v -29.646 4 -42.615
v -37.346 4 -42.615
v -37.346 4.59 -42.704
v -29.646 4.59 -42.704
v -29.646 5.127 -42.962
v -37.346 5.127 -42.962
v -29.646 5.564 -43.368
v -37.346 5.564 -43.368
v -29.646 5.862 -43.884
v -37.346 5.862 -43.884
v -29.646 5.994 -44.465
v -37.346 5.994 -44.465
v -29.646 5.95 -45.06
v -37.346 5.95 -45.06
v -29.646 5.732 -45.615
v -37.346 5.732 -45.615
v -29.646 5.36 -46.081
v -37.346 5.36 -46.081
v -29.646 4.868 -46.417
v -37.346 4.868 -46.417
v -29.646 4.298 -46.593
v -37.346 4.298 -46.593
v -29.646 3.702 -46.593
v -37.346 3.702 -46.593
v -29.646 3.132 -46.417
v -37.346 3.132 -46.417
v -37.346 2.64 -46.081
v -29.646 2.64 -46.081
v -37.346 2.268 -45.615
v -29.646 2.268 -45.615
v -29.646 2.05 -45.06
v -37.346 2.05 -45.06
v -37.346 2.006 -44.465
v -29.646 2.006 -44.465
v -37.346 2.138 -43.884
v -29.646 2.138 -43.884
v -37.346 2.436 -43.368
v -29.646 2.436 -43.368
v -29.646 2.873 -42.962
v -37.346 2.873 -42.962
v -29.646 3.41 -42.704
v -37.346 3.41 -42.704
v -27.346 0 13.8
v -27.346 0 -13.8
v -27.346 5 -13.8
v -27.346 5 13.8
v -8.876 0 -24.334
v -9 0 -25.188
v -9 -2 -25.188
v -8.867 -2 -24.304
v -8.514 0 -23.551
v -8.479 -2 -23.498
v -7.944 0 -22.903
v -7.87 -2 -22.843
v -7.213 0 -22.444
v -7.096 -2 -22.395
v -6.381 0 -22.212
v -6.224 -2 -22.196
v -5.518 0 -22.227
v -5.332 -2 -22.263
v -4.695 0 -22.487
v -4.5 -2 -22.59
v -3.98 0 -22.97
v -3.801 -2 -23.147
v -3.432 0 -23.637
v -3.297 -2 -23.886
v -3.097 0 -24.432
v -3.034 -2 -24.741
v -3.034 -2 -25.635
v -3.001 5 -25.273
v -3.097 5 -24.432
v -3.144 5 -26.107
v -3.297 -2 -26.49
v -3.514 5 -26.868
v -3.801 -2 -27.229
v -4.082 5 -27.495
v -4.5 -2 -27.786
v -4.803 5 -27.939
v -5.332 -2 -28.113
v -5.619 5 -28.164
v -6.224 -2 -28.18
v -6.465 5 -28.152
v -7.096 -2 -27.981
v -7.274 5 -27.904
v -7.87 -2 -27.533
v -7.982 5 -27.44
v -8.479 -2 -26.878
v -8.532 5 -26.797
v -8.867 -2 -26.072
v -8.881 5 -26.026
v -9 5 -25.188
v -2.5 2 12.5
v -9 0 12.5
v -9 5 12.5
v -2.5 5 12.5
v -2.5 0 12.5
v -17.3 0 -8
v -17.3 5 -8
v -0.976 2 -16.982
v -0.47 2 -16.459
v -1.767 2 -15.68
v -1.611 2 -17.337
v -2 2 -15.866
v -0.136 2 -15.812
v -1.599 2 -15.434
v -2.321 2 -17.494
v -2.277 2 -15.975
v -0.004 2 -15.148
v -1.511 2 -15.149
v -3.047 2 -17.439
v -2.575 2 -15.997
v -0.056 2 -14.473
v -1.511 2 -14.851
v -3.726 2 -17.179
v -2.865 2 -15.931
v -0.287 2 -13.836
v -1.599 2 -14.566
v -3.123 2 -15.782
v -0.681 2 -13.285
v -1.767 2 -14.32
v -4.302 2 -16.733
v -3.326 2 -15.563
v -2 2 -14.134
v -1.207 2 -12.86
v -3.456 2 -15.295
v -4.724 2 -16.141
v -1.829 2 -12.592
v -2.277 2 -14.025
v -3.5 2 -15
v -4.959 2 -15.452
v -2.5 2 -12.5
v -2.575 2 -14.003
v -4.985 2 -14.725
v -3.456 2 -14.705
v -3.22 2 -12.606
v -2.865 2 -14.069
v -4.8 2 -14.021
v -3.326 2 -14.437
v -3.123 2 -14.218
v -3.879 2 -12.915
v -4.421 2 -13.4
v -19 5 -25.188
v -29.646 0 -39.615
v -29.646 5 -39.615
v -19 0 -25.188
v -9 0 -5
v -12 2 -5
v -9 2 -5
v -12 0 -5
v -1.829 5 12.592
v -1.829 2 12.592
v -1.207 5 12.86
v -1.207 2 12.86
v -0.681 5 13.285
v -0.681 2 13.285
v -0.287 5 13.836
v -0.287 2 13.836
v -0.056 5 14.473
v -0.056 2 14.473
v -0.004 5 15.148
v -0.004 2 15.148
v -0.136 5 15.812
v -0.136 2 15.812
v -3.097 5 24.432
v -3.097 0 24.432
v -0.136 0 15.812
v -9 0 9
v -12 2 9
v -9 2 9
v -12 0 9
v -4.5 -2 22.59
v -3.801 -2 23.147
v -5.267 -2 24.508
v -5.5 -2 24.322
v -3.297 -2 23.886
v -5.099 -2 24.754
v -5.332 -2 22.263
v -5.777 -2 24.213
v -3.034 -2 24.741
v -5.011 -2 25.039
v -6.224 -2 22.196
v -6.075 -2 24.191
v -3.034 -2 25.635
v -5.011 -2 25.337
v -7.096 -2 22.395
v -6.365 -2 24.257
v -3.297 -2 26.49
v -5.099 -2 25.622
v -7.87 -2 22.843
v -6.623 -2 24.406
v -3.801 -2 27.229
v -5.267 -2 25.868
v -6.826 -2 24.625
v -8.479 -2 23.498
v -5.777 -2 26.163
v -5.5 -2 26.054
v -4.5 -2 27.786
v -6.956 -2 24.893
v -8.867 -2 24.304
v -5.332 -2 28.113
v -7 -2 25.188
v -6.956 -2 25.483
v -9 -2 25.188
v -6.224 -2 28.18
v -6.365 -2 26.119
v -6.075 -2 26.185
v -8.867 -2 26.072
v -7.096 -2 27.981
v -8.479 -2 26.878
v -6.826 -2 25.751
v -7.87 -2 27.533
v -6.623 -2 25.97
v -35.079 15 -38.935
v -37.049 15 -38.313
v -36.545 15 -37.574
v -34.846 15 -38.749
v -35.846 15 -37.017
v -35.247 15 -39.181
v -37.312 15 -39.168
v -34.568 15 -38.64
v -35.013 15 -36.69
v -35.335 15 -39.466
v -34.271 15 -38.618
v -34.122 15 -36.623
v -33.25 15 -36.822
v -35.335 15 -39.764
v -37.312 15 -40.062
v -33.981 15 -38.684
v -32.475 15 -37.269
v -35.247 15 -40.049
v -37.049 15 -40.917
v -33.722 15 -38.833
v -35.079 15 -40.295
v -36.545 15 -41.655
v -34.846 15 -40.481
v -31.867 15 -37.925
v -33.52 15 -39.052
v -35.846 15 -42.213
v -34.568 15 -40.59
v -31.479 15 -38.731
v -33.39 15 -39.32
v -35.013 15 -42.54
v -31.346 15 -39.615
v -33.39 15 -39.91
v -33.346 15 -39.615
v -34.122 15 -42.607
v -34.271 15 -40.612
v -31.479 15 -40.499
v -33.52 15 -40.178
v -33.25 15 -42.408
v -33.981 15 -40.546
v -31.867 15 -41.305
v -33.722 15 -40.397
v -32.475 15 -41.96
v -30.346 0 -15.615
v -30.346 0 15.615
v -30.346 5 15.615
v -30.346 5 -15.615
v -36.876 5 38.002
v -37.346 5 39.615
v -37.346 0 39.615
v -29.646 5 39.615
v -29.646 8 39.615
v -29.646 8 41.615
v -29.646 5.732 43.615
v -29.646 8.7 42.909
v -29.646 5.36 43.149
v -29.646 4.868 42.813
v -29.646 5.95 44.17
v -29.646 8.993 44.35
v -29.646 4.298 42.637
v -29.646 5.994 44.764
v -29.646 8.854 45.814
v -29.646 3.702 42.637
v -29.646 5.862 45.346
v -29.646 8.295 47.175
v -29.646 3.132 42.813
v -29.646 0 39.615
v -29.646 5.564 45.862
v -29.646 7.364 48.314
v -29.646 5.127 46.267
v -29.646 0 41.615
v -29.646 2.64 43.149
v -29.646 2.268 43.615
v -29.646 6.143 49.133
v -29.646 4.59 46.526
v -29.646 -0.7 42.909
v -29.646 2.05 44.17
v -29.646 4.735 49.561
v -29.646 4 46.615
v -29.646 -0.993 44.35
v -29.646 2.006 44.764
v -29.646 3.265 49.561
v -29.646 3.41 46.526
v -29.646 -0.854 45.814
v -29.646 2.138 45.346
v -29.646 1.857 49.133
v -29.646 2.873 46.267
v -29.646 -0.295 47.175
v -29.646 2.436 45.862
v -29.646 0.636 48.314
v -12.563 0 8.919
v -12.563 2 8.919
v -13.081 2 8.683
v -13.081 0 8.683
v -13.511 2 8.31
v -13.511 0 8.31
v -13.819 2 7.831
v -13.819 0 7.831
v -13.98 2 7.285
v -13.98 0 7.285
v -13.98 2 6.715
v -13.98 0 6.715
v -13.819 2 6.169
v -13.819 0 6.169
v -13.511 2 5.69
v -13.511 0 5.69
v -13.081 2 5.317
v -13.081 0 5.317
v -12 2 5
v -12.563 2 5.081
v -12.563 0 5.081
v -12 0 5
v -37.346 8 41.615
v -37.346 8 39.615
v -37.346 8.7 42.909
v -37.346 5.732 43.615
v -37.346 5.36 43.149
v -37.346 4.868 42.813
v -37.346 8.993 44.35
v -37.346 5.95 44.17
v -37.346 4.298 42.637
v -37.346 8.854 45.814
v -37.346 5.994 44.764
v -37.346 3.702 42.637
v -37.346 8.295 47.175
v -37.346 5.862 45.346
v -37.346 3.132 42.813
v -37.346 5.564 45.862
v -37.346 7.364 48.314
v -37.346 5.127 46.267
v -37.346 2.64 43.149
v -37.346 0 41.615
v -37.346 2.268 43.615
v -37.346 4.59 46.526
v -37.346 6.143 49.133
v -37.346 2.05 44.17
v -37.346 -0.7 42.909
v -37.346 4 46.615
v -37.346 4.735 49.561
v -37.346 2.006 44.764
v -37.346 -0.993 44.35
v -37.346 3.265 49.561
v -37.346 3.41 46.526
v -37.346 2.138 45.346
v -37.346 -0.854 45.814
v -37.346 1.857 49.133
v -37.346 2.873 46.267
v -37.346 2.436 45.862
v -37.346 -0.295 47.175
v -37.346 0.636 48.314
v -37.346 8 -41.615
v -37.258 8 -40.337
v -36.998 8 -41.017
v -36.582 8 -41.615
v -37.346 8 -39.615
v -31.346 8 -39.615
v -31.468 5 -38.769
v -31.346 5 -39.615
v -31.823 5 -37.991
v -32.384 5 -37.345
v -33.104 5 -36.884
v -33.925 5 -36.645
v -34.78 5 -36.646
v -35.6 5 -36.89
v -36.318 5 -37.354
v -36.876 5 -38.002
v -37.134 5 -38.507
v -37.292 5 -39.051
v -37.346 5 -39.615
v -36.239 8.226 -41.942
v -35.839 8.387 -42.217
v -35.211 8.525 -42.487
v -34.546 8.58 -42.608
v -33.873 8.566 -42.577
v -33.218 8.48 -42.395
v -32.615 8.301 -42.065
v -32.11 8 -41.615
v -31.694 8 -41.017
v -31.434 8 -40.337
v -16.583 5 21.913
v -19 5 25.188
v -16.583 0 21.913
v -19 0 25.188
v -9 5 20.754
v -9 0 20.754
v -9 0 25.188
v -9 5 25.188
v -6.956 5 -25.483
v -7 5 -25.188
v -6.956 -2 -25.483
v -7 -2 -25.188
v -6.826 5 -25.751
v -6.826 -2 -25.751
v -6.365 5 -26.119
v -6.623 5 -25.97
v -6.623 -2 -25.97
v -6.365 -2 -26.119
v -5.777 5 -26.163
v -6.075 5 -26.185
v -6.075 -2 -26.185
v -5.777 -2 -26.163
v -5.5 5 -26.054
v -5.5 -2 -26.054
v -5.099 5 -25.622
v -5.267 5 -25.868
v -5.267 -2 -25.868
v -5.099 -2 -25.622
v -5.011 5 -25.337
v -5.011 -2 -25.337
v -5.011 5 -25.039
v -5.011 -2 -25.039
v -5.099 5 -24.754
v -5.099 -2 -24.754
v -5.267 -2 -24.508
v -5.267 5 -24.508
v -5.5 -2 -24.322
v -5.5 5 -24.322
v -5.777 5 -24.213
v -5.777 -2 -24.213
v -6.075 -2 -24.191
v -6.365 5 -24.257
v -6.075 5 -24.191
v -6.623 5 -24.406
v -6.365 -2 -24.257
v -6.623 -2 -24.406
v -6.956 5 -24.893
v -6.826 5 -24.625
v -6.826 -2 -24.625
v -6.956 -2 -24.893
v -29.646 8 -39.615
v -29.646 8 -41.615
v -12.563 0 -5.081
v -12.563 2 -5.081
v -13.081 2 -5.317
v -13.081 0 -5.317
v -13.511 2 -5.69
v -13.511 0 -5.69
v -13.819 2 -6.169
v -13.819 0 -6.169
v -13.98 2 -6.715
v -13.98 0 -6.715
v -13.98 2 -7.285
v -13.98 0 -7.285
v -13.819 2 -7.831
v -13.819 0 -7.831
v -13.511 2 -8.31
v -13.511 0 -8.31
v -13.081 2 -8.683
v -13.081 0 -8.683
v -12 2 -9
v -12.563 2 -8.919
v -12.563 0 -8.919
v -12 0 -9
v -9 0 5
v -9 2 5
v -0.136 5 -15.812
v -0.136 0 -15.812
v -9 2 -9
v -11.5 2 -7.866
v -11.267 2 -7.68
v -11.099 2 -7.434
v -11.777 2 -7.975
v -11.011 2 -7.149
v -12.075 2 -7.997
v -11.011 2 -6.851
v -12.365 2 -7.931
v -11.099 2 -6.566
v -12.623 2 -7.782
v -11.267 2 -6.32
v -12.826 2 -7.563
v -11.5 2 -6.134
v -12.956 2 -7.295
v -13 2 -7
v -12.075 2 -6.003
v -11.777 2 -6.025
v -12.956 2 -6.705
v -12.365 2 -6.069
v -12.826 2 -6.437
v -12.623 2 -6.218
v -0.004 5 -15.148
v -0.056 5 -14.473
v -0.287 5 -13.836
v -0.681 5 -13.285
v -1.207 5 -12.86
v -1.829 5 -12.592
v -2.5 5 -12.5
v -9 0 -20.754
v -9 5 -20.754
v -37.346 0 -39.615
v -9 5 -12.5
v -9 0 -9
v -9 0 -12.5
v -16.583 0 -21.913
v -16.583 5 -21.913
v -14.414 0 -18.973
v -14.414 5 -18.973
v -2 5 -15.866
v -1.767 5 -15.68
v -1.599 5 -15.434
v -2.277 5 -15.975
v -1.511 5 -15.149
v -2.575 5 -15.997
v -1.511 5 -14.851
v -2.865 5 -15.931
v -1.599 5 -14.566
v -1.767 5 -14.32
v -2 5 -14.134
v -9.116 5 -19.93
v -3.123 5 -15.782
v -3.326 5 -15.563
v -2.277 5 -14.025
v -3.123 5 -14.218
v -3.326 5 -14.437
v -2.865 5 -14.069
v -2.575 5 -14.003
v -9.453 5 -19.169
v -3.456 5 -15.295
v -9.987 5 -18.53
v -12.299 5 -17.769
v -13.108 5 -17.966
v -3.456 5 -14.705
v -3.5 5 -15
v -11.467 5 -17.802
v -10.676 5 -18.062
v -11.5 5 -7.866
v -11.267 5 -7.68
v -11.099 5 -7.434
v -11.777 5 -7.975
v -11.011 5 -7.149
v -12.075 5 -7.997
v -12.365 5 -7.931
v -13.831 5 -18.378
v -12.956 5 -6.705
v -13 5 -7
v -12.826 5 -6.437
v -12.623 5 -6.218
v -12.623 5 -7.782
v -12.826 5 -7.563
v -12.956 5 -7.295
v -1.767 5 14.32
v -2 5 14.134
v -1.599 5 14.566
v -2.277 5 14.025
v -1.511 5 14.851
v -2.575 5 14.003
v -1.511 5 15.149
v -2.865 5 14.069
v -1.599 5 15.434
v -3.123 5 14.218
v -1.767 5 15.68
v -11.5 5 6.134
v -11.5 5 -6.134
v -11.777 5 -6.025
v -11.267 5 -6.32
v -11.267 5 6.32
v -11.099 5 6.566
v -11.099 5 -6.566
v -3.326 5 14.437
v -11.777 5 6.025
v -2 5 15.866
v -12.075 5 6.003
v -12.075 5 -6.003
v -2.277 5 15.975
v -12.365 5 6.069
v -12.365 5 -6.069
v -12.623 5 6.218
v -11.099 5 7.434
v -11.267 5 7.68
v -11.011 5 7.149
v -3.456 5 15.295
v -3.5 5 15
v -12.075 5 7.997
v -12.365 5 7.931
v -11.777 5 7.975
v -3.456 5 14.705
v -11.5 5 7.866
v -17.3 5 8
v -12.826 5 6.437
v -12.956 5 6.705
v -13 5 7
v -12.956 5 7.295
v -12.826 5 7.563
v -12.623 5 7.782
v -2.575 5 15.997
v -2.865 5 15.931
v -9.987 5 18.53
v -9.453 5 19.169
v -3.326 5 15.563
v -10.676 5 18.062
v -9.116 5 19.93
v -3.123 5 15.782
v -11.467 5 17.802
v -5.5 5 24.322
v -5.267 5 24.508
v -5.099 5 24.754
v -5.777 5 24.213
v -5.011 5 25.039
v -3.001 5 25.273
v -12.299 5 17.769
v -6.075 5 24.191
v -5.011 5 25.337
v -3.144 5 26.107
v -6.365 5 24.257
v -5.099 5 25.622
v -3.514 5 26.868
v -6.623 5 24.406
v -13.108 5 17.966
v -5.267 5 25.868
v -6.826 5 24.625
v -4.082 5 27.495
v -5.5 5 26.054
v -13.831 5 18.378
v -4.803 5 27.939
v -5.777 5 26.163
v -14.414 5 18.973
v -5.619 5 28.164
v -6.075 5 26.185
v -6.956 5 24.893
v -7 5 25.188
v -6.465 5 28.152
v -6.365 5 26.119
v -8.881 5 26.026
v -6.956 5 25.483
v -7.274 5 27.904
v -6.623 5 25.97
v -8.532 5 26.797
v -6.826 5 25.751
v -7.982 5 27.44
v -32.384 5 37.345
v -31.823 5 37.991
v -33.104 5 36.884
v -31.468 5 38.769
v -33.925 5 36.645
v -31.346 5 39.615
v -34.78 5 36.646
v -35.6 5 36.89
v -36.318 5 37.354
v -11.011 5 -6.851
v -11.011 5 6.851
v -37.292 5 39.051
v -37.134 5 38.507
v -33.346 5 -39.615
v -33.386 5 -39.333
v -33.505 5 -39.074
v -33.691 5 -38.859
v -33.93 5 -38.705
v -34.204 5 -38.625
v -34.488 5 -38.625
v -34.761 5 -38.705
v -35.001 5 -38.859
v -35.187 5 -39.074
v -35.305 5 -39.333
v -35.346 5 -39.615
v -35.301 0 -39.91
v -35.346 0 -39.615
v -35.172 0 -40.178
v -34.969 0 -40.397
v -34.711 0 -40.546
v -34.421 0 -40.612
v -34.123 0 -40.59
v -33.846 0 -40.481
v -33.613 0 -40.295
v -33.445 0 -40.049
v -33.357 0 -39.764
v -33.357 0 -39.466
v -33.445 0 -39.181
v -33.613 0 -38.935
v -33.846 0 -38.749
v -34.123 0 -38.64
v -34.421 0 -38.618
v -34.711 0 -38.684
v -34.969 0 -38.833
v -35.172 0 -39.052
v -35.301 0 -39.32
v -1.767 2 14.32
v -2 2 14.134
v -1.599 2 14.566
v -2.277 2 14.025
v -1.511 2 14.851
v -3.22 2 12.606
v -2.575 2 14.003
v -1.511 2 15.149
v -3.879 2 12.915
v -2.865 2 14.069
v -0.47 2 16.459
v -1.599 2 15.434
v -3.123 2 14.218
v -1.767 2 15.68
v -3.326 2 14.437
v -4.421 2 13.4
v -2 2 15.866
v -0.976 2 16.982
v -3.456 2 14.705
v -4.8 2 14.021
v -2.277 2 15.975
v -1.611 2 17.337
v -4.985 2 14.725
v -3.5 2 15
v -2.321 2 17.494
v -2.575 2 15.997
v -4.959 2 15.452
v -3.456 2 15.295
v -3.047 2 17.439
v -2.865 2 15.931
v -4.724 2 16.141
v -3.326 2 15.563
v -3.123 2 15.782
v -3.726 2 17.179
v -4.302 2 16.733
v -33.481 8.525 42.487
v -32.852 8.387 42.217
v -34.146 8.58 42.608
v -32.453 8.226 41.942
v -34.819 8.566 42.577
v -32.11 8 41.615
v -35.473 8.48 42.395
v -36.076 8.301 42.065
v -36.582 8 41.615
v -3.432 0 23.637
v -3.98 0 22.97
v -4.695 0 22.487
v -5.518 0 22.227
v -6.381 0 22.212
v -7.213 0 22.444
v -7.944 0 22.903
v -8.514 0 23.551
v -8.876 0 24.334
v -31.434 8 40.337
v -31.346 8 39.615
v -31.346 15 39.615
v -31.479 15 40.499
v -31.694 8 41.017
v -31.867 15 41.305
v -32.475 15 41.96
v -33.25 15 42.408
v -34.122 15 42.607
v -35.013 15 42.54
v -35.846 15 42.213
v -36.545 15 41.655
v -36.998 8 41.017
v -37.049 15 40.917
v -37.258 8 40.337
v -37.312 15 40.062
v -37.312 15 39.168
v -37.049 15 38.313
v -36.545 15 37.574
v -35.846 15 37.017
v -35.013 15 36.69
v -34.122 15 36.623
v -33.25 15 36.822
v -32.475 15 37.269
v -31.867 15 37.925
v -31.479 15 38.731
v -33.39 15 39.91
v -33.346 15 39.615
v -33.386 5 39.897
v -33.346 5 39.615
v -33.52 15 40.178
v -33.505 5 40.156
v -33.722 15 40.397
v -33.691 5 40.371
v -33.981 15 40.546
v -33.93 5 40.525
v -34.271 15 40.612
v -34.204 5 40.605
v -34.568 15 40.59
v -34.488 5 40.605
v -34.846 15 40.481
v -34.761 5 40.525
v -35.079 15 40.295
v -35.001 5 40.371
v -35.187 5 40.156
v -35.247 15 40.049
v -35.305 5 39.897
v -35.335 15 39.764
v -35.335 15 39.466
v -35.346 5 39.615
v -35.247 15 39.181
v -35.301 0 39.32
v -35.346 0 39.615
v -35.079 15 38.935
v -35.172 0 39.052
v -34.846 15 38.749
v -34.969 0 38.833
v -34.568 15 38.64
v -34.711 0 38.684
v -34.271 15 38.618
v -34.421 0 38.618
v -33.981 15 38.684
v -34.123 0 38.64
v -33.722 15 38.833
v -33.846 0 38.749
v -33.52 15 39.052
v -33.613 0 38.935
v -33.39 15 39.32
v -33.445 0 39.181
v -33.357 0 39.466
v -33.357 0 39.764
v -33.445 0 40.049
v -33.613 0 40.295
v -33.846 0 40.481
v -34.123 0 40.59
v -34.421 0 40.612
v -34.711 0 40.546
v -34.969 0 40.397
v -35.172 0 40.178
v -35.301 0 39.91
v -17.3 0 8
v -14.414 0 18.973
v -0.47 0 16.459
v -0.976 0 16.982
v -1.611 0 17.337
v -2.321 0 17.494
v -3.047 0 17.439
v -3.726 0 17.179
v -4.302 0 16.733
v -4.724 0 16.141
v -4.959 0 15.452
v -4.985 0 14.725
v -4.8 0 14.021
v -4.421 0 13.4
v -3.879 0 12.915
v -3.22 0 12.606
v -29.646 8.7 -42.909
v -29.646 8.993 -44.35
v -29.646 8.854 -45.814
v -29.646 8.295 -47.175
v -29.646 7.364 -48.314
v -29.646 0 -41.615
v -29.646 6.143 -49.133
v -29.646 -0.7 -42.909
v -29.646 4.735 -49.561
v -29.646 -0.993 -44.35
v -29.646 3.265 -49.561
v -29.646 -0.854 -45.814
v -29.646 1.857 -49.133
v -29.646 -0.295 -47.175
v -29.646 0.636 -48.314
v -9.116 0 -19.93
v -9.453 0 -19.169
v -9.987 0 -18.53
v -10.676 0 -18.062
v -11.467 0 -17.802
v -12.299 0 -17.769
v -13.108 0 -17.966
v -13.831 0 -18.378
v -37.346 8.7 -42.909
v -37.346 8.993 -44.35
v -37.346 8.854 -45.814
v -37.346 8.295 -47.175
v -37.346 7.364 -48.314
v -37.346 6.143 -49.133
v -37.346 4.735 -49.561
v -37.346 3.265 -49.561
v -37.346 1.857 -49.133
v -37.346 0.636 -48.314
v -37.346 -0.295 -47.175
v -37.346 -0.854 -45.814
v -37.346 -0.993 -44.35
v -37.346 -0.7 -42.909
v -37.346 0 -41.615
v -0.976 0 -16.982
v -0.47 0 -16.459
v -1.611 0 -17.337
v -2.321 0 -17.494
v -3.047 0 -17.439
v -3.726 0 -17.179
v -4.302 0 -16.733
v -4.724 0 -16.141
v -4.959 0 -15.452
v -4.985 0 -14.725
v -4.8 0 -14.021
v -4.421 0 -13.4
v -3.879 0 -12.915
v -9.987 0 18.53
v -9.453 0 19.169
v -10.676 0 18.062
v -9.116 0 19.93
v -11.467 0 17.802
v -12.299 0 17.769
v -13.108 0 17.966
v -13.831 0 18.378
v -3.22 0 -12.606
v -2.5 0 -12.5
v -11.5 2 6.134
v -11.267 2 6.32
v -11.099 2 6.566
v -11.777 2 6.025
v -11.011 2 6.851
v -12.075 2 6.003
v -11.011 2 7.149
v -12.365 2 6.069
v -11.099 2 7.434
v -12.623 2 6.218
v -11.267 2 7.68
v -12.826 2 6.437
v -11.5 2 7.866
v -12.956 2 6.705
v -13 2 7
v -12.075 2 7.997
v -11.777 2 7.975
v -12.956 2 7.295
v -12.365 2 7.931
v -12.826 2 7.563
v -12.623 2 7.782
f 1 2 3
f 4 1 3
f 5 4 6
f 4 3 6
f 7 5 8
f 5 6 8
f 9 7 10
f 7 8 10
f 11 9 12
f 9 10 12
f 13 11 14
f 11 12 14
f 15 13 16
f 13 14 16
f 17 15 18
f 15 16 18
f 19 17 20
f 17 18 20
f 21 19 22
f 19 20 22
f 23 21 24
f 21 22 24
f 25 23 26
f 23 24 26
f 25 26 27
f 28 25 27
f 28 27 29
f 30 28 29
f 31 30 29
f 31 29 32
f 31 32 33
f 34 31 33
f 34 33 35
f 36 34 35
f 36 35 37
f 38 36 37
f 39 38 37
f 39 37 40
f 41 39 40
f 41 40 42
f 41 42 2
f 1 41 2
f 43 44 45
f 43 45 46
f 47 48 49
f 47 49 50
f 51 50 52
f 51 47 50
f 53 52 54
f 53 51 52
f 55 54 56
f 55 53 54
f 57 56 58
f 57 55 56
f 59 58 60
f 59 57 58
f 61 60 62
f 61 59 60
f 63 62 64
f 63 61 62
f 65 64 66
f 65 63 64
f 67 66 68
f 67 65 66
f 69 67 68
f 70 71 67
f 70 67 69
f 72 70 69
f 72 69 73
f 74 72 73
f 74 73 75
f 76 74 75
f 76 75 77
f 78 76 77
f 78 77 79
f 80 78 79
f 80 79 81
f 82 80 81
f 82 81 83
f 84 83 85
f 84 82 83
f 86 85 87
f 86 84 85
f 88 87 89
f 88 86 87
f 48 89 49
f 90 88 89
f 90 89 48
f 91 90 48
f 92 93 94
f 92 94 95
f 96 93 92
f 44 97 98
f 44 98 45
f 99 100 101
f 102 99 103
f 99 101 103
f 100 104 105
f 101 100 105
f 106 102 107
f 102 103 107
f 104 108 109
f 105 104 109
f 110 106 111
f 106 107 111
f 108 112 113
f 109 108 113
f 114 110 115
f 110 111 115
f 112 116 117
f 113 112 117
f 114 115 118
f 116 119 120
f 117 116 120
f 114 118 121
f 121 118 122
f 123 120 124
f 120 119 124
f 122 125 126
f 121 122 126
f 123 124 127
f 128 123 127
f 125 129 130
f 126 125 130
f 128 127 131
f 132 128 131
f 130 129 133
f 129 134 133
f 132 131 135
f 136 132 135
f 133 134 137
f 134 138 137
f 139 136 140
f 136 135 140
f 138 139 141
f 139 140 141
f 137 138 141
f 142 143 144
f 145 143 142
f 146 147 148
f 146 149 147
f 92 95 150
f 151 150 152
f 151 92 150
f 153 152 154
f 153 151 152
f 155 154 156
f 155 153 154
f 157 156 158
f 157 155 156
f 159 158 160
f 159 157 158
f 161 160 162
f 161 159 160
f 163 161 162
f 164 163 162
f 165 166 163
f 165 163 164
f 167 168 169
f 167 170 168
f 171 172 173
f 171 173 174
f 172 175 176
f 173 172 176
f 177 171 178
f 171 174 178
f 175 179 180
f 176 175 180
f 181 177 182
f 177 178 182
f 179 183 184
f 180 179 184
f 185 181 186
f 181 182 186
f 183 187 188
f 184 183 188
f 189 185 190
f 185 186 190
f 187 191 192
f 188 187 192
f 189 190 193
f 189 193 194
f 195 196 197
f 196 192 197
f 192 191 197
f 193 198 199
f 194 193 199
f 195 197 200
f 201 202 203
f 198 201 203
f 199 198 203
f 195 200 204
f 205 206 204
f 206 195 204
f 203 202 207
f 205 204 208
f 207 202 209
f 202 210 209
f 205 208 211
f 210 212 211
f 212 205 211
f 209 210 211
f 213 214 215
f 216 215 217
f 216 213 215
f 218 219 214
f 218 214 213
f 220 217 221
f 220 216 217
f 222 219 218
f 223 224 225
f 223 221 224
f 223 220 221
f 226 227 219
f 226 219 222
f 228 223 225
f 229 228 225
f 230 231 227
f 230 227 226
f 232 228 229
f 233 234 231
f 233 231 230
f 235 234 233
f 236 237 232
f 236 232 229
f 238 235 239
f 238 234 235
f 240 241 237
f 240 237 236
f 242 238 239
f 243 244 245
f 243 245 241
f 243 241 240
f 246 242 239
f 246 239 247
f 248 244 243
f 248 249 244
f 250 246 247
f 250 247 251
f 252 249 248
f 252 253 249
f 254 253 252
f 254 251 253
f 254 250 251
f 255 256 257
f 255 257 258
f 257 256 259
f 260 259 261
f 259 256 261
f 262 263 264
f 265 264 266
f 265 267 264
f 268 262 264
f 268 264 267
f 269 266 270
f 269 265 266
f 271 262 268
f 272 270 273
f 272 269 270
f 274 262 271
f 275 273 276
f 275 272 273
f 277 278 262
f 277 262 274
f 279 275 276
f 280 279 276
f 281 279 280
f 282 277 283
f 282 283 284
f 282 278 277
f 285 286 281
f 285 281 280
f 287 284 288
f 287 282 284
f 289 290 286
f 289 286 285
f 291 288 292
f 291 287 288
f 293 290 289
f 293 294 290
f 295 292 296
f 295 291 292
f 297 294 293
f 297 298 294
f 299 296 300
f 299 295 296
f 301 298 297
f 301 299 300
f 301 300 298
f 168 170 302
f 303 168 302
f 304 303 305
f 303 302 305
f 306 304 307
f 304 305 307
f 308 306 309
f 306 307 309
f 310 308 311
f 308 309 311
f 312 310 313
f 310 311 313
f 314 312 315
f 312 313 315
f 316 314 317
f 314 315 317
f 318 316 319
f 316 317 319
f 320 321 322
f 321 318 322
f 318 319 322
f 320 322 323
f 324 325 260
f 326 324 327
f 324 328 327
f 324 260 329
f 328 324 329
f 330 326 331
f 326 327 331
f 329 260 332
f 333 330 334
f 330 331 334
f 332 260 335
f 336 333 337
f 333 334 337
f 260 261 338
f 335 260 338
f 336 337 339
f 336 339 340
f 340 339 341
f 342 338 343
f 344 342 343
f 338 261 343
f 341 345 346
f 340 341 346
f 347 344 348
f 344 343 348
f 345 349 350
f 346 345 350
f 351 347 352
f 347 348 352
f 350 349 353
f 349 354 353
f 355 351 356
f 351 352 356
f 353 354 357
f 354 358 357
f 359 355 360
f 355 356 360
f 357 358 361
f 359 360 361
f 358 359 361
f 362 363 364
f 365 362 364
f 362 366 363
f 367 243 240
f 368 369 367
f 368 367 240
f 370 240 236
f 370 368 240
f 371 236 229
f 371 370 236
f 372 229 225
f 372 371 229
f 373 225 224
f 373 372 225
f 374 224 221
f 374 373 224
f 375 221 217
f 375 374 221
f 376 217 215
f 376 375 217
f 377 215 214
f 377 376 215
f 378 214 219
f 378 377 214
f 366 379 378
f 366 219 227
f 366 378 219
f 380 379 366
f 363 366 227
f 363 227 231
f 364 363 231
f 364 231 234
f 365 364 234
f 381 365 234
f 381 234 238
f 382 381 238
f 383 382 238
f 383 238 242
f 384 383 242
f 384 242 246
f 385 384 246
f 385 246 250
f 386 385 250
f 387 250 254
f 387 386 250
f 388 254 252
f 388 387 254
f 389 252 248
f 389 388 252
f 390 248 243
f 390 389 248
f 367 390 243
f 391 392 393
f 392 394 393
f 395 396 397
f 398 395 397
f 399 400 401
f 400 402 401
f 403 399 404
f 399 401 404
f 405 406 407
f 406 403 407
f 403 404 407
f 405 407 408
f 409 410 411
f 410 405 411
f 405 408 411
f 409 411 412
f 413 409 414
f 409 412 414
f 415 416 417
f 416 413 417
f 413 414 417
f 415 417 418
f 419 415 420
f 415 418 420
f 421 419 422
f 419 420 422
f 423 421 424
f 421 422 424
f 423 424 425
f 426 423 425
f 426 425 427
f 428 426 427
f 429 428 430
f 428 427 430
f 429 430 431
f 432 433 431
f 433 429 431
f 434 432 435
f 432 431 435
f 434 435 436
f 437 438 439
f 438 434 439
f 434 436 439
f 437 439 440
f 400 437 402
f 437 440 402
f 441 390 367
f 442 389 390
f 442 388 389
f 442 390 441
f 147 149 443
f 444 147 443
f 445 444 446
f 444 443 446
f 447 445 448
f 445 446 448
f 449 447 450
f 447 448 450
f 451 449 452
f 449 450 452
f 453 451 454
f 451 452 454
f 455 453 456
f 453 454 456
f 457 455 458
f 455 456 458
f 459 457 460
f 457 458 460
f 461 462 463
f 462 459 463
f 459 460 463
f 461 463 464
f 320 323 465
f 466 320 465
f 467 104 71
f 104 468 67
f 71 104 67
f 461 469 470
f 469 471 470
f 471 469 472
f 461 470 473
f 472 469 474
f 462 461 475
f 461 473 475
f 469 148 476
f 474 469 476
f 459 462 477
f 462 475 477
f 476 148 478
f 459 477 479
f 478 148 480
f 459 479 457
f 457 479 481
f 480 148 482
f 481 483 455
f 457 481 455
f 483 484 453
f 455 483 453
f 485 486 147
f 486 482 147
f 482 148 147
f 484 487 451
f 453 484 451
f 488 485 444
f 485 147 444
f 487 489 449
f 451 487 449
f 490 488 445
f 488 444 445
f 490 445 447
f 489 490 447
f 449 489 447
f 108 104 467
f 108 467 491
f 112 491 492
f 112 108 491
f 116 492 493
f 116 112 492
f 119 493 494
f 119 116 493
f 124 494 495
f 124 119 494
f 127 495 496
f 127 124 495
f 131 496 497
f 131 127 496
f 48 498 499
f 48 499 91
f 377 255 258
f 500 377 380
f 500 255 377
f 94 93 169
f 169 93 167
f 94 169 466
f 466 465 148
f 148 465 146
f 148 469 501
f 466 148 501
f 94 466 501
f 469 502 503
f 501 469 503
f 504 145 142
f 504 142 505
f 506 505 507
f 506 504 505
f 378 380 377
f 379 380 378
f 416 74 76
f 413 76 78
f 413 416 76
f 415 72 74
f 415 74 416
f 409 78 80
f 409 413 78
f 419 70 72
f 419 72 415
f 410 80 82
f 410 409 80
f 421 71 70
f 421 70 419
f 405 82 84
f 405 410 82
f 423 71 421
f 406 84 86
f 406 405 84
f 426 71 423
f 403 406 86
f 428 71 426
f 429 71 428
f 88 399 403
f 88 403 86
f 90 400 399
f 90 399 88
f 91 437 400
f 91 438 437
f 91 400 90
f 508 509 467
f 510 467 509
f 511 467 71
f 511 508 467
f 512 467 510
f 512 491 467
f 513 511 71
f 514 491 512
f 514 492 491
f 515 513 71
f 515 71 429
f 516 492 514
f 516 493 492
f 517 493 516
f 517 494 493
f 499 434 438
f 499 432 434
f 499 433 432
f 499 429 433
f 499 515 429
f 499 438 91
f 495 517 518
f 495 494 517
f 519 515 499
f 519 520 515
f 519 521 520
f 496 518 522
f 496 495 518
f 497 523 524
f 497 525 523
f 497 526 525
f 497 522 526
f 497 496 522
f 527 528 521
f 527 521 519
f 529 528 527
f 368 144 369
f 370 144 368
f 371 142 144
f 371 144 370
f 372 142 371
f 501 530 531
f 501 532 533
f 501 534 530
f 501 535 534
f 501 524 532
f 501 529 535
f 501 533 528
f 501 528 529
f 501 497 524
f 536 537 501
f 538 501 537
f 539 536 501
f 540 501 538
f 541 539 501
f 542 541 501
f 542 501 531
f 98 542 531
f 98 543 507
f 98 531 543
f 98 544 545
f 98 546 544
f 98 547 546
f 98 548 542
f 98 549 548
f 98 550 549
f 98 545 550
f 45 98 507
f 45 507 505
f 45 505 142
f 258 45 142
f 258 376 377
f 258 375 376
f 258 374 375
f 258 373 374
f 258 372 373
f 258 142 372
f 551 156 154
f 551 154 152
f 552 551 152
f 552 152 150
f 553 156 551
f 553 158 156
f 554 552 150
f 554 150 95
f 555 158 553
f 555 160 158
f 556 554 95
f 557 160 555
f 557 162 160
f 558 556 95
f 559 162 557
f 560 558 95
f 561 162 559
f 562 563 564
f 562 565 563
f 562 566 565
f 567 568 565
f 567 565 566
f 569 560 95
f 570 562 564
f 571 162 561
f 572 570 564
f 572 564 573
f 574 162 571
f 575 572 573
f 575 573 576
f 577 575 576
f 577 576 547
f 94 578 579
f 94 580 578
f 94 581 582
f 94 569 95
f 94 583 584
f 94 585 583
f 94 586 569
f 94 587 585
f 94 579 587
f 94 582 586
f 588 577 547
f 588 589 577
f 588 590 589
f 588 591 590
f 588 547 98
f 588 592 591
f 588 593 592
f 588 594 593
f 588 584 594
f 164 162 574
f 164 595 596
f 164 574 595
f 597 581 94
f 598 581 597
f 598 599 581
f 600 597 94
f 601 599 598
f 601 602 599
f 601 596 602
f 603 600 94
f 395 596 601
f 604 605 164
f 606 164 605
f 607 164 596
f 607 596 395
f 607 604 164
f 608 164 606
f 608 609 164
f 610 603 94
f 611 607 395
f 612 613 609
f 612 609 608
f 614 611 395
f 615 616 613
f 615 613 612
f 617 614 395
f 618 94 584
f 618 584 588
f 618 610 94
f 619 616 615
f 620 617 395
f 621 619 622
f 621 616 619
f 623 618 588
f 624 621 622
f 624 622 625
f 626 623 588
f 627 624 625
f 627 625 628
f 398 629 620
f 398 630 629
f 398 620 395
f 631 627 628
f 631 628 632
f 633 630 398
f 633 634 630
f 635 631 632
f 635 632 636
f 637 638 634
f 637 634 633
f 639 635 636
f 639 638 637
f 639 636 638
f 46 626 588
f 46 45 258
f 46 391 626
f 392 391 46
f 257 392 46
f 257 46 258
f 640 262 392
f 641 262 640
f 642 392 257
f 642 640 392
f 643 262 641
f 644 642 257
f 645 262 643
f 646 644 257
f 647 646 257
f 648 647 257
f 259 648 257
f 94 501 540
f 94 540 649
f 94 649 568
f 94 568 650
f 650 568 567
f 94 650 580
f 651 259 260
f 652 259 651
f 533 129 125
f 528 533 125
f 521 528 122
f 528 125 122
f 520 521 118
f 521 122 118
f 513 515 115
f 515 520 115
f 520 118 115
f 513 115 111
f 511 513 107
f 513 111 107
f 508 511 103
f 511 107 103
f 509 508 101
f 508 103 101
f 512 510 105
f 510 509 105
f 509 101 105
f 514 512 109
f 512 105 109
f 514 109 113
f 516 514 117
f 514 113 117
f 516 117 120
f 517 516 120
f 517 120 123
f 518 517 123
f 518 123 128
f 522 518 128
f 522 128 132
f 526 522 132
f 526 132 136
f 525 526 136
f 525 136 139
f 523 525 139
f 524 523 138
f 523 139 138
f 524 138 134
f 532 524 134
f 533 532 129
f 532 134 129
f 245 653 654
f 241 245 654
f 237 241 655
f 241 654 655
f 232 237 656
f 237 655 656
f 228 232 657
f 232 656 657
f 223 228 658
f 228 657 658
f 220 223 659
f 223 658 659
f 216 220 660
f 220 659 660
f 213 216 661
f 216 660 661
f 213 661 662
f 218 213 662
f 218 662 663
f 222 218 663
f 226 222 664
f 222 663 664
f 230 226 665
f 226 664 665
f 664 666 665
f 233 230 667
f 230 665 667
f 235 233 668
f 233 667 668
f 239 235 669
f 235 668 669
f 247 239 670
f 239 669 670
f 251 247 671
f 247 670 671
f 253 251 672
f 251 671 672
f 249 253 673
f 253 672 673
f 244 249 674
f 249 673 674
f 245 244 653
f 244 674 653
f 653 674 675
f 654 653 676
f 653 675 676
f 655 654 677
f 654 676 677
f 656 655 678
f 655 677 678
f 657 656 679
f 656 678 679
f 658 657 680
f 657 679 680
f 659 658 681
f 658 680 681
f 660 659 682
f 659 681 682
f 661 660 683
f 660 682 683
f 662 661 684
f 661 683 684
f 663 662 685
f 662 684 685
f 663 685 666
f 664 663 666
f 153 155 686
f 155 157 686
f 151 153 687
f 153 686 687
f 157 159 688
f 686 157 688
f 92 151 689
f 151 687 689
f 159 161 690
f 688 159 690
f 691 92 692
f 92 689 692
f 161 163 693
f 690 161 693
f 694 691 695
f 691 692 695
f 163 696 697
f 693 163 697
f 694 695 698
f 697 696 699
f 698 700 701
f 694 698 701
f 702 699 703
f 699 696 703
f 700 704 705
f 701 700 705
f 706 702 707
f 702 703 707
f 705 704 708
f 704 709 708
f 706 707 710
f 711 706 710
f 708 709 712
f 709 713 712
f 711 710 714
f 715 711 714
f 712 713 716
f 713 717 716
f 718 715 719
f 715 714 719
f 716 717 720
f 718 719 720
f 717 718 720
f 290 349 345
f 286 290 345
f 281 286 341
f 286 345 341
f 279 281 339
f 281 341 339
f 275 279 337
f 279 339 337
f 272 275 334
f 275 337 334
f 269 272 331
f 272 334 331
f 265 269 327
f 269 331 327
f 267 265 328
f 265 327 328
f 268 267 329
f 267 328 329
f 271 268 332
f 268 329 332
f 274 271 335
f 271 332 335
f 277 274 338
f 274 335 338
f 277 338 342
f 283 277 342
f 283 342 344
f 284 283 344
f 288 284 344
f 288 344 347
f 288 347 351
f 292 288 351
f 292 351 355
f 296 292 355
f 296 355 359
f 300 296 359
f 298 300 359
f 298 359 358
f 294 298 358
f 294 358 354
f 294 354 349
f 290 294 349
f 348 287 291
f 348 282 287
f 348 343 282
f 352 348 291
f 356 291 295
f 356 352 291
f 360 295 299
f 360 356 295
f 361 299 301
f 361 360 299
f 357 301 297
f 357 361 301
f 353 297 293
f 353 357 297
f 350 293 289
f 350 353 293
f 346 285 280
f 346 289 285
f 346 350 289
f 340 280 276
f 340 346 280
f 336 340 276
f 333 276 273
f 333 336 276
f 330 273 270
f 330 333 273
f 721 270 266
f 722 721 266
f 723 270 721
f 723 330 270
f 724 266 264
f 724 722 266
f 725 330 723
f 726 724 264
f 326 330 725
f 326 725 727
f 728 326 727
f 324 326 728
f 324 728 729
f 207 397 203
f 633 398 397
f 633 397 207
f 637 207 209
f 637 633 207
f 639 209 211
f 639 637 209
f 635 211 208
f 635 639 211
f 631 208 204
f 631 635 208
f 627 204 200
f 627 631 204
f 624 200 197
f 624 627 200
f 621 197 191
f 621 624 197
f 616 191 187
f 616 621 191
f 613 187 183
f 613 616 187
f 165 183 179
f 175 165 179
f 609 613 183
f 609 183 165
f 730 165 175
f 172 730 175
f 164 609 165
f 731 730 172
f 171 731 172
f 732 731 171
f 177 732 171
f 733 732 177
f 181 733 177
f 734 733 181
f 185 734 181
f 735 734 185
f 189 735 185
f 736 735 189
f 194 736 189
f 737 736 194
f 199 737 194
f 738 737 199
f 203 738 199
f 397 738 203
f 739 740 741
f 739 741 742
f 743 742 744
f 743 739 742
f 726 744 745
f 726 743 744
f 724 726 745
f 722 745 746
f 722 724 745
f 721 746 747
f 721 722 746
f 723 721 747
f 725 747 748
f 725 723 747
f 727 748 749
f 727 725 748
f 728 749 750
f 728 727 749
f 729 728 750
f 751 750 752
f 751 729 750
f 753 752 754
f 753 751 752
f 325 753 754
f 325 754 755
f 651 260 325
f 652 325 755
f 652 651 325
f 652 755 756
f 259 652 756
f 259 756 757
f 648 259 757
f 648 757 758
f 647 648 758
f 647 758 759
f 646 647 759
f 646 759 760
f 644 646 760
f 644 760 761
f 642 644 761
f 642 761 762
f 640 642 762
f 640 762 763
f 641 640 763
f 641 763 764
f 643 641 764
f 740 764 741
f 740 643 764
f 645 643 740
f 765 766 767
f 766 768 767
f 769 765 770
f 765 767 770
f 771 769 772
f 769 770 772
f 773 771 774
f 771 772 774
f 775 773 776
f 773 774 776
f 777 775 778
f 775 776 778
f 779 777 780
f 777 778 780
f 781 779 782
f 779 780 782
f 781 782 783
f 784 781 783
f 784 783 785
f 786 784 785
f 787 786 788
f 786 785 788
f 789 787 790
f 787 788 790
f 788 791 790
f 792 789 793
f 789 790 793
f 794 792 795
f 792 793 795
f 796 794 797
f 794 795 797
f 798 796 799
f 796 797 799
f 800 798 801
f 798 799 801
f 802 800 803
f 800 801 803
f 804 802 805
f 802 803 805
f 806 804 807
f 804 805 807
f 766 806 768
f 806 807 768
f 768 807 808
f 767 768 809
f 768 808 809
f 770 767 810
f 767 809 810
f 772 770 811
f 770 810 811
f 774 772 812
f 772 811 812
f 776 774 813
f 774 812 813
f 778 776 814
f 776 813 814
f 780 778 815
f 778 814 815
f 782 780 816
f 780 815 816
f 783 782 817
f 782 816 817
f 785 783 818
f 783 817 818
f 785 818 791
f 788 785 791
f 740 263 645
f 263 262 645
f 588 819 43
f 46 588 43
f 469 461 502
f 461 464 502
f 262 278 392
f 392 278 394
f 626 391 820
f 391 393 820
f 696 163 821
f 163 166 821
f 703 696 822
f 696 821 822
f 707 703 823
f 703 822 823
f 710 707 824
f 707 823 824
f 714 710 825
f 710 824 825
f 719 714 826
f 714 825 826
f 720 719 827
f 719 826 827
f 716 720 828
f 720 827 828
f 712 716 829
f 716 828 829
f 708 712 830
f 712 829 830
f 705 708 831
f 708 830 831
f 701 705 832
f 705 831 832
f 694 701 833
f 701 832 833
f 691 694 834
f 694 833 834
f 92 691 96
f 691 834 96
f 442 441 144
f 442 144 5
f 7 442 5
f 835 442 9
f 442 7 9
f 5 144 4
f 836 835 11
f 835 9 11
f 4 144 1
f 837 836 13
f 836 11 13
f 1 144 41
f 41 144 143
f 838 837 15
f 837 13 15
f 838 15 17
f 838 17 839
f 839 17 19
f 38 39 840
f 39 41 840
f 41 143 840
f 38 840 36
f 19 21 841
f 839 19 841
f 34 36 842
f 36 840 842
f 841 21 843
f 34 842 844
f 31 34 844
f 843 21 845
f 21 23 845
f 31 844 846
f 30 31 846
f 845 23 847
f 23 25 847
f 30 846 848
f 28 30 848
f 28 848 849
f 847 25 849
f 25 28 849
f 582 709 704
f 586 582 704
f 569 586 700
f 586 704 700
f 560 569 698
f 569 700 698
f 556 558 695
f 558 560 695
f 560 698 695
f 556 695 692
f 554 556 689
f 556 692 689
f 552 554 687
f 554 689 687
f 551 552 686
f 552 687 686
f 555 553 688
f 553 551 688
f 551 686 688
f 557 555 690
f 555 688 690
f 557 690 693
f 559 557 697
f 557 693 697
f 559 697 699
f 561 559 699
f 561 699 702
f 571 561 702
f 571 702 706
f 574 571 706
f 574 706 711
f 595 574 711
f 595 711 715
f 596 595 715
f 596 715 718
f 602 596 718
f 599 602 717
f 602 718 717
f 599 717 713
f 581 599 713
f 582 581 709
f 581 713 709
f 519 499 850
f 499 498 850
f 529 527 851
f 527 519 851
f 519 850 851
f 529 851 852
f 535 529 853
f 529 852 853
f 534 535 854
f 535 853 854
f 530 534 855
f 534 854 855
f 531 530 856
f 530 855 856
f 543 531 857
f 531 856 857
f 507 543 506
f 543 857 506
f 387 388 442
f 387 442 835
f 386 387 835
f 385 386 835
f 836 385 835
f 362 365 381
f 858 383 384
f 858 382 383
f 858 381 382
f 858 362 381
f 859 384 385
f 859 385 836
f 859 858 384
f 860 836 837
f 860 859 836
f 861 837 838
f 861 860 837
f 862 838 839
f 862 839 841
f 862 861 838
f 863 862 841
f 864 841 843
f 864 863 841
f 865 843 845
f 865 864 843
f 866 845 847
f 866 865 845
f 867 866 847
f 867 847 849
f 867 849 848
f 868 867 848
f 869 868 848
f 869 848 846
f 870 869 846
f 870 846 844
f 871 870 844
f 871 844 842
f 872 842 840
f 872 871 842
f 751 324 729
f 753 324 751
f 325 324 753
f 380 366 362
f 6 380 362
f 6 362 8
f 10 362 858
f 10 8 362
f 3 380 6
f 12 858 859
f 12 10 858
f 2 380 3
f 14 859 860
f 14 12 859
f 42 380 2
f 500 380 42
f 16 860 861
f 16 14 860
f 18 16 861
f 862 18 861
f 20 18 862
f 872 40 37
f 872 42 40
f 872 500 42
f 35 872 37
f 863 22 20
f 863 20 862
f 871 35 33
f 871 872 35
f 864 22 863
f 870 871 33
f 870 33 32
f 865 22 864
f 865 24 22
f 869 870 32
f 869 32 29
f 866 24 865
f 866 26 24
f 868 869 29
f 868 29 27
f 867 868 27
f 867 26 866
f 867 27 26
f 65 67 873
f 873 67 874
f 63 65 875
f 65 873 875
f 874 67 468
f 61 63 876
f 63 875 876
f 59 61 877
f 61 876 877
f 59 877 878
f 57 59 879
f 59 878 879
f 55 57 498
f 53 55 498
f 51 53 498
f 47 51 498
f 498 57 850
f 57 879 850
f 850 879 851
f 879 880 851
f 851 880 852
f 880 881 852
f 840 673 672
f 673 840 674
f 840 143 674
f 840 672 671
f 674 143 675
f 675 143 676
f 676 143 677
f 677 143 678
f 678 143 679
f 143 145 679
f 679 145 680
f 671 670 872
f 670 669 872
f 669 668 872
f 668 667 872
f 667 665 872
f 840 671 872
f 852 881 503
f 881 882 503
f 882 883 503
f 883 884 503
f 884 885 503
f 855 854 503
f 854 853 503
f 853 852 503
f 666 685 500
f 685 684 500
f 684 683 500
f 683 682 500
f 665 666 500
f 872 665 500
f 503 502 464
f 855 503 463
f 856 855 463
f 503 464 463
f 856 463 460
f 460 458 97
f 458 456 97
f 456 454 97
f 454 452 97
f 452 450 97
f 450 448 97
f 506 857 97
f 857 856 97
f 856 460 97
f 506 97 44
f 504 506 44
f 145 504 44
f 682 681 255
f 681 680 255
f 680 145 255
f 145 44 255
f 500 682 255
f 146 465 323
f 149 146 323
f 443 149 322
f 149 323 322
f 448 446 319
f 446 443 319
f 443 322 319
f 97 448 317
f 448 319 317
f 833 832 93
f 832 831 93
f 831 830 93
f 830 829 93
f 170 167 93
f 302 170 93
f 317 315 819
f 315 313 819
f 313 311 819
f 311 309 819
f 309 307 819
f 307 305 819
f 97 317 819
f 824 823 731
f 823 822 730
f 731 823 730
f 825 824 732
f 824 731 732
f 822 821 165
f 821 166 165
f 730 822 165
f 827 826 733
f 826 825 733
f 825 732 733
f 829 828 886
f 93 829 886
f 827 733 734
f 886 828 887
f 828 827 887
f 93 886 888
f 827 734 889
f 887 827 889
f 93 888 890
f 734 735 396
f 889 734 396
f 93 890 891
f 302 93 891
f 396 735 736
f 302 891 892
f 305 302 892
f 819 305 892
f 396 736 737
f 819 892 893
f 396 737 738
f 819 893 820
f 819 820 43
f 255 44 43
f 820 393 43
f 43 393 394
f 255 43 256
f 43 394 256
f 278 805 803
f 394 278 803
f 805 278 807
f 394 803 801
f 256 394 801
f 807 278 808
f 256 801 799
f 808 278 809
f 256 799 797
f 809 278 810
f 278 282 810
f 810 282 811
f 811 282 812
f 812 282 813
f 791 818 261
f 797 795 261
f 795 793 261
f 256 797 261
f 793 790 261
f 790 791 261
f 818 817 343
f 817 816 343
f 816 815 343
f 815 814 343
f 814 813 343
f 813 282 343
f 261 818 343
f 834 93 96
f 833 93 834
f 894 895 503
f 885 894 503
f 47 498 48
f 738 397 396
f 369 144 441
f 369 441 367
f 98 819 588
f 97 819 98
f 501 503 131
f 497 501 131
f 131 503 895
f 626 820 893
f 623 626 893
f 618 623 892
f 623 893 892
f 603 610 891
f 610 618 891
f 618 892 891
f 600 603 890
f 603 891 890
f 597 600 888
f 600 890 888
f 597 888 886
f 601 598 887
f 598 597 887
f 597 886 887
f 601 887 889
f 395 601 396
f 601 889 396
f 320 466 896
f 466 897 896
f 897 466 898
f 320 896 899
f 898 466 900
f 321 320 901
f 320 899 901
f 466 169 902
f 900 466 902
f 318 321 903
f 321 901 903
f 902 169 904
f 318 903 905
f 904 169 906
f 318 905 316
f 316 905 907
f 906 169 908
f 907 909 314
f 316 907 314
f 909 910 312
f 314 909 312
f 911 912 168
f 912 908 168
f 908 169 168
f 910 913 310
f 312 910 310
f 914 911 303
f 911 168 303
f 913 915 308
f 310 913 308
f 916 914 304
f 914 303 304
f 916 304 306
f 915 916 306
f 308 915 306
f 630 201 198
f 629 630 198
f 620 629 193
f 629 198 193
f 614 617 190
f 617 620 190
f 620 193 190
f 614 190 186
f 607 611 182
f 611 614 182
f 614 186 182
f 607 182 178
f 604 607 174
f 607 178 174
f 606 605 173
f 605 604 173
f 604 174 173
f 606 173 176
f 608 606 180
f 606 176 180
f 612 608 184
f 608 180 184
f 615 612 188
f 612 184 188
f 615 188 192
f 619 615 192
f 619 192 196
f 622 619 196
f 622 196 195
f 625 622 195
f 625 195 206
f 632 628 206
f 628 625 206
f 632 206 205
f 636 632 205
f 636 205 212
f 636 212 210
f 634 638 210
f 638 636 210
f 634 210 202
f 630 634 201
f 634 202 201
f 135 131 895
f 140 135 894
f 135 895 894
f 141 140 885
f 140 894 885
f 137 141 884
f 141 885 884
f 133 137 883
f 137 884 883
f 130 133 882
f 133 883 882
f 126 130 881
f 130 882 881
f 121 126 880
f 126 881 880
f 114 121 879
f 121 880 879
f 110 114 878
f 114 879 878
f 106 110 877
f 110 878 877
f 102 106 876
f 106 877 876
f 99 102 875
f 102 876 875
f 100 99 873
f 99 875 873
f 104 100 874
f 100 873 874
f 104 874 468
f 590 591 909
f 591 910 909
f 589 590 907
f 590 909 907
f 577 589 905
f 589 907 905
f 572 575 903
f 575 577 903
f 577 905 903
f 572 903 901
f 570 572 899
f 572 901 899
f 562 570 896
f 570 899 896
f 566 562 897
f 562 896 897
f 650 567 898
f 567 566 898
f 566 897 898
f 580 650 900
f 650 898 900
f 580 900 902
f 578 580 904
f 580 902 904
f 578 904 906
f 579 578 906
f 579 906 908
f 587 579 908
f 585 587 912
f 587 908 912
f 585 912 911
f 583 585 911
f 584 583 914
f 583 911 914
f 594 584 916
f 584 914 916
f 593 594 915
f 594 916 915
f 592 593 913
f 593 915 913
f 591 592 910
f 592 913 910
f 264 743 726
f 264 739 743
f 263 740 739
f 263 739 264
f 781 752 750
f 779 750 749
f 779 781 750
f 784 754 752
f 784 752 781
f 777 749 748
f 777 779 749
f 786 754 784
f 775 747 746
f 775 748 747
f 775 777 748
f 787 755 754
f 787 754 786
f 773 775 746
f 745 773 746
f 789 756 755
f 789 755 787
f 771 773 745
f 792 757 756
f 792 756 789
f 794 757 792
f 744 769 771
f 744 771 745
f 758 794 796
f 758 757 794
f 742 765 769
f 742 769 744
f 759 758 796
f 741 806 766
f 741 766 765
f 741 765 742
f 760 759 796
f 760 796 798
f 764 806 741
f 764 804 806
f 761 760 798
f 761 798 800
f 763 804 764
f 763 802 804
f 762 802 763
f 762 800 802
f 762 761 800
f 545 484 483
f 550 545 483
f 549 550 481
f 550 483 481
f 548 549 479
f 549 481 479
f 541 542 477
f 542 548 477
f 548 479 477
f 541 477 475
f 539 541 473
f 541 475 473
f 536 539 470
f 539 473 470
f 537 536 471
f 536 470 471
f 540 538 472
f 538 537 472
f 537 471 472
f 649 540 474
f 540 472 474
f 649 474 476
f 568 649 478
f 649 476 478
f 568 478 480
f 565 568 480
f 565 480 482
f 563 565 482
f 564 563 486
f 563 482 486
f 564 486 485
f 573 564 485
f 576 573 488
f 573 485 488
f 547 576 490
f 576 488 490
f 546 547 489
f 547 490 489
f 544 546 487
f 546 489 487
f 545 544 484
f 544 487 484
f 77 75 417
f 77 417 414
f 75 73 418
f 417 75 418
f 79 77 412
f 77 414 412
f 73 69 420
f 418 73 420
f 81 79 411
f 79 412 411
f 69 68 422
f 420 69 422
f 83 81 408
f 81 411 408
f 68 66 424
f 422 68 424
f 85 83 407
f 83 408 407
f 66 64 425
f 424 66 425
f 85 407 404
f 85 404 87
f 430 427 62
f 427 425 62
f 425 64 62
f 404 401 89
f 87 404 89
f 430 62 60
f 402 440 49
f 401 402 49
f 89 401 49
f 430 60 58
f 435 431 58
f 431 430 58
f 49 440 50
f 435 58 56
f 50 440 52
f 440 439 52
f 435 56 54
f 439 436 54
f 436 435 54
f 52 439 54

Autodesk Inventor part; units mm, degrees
ref_plane "YZ Plane" through (0, 0, 0) normal (1, 0, 0) x (0, 1, 0)
ref_plane "XZ Plane" through (0, 0, 0) normal (0, 1, 0) x (-1, 0, 0)
ref_plane "XY Plane" through (0, 0, 0) normal (0, 0, 1) x (1, 0, 0)
sketch "Sketch1" plane through (0, 0, 0) normal (0, 1, 0) x (-1, 0, 0)
  line L0 (0, 0) -> (9, 0)
  line L1 (9, 0) -> (9, -12.5)
  line L2 (9, -12.5) -> (2.5, -12.5)
  circle A0 centre (2.5, -15) radius 2.5
  circle A1 centre (2.5, -15) radius 1
  line L3 (2.5, -15) -> (17.5, -15) construction
  circle A2 centre (6, -25.188) radius 3
  circle A3 centre (6, -25.188) radius 1
  line L4 (0, -15.4175) -> (3.0968, -24.4319)
  line L5 (9, 0) -> (17.3, 0)
  line L6 (17.3, 0) -> (17.3, -8)
  line L7 (17.3, -8) -> (27.3459, -13.8)
  line L8 (27.3459, -13.8) -> (27.3459, 0)
  line L9 (30.3459, 0) -> (30.3459, -15.6149)
  line L10 (30.3459, -15.6149) -> (37.3459, -39.6149)
  line L11 (37.3459, -39.6149) -> (37.3459, -49.6149)
  line L12 (29.6459, -39.6149) -> (29.6459, -49.6149)
  line L13 (37.3459, -49.6149) -> (29.6459, -49.6149)
  line L14 (29.6459, -39.6149) -> (80.5305, -39.6149) construction
  arc A4 (14.4139, -18.9731) -> (9, -20.7544) centre (12, -20.7544) ccw
  line L15 (29.6459, -39.6149) -> (19, -25.188)
  line L16 (19, -25.188) -> (16.5834, -21.9131)
  line L17 (16.5834, -21.9131) -> (14.4139, -18.9731)
  line L18 (9, -20.7544) -> (9, -25.188)
  circle A5 centre (12, -7) radius 1
  circle A6 centre (34.3459, -39.6149) radius 3
  circle A7 centre (34.3459, -39.6149) radius 1
  line L19 (30.3459, 0) -> (0, 0)
  line L20 (9, 0) -> (9, 12.5)
  line L21 (9, 12.5) -> (2.5, 12.5)
  circle A8 centre (2.5, 15) radius 2.5
  circle A9 centre (2.5, 15) radius 1
  line L22 (2.5, 15) -> (17.5, 15) construction
  circle A10 centre (6, 25.188) radius 3
  circle A11 centre (6, 25.188) radius 1
  line L23 (0, 15.4175) -> (3.0968, 24.4319)
  line L24 (17.3, 0) -> (17.3, 8)
  line L25 (17.3, 8) -> (27.3459, 13.8)
  line L26 (27.3459, 13.8) -> (27.3459, 0)
  line L27 (30.3459, 0) -> (30.3459, 15.6149)
  line L28 (30.3459, 15.6149) -> (37.3459, 39.6149)
  line L29 (37.3459, 39.6149) -> (37.3459, 49.6149)
  line L30 (29.6459, 39.6149) -> (29.6459, 49.6149)
  line L31 (37.3459, 49.6149) -> (29.6459, 49.6149)
  line L32 (29.6459, 39.6149) -> (80.5305, 39.6149) construction
  arc A12 (9, 20.7544) -> (14.4139, 18.9731) centre (12, 20.7544) ccw
  line L33 (29.6459, 39.6149) -> (19, 25.188)
  line L34 (19, 25.188) -> (16.5834, 21.9131)
  line L35 (16.5834, 21.9131) -> (14.4139, 18.9731)
  line L36 (9, 20.7544) -> (9, 25.188)
  circle A13 centre (12, 7) radius 1
  circle A14 centre (34.3459, 39.6149) radius 3
  circle A15 centre (34.3459, 39.6149) radius 1
  arc A16 (12, -9) -> (12, -5) centre (12, -7) ccw
  arc A17 (12, 5) -> (12, 9) centre (12, 7) ccw
  line L37 (12, 5) -> (9, 5)
  line L38 (12, 9) -> (9, 9)
  line L39 (12, -5) -> (9, -5)
  line L40 (12, -9) -> (9, -9)
  point P0 (0.1356, 15.8123)
  point P1 (0.1356, -15.8123)
  point P2 (36.8755, -38.0021)
  dimension "d3" = 5
  dimension "d0" = 9
  dimension "d1" = 12.5
  dimension "d4" = 2
  dimension "d7" = 6
  dimension "d9" = 2
  dimension "d13" = 8.3
  dimension "d14" = 8
  dimension "d15" = 11.6
  dimension "d16" = 120
  dimension "d17" = 3
  dimension "d20" = 7.7
  dimension "d21" = 10
  dimension "d23" = 6
  dimension "d24" = 10
  dimension "d27" = 2
  dimension "d28" = 7
  dimension "d29" = 6
  dimension "d30" = 2
  dimension "d31" = 4
  dimension "d32" = 4
extrude "Extrusion1" add sketch "Sketch1" along normal blind 5 contours L5 L6 L7 L8 L19 L9 L10 A6 L11 L13 L12 L15 L16 L17 A4 L18 A2 L4 A0 L2 L1 L40 A16 L39 | L20 L37 A17 L38 L21 A8 L23 A10 L36 A12 L35 L34 L33 L30 L31 L29 A14 L28 L27 L19 L26 L25 L24 L5 | L39 A16 L40 L1 | L20 L38 A17 L37 | A0 | A8 | L10 A6 | A14 L28 | A2 | A10 picked at (36.5127, -38.9975) picked at (36.5127, 38.9975)
extrude "Extrusion2" cut sketch "Sketch1" along normal blind 2 contours L39 A16 L40 L1 | L20 L38 A17 L37 | A0 | A8
extrude "Extrusion3" add sketch "Sketch1" against normal blind 2 contours A2 | A10
sketch "Sketch2" plane through (0, 5, 0) normal (0, 1, 0) x (1, 0, 0)
  circle A0 centre (-34.3459, 39.6149) radius 1 projected
  line L0 (-37.3459, 49.6149) -> (-37.3459, 39.6149) projected
  circle A1 centre (-34.3459, 39.6149) radius 3
  circle A2 centre (-34.3459, -39.6149) radius 1 projected
  circle A3 centre (-34.3459, -39.6149) radius 3
  line L1 (-37.3459, -39.6149) -> (-37.3459, -49.6149) projected
  line L2 (-37.3459, -39.6149) -> (-37.3459, -49.6149)
  line L3 (-37.3459, -49.6149) -> (-29.6459, -49.6149) projected
  line L4 (-37.3459, -49.6149) -> (-29.6459, -49.6149)
  line L5 (-29.6459, -49.6149) -> (-29.6459, -39.6149) projected
  line L6 (-29.6459, -49.6149) -> (-29.6459, -39.6149)
  line L7 (-29.6459, -39.6149) -> (-31.3459, -39.6149)
  line L8 (-37.3459, 39.6149) -> (-37.3459, 49.6149)
  line L9 (-37.3459, 49.6149) -> (-29.6459, 49.6149)
  line L10 (-29.6459, 49.6149) -> (-29.6459, 39.6149)
  line L11 (-29.6459, 39.6149) -> (-31.3459, 39.6149)
  point P0 (0, 0)
extrude "Extrusion5" add sketch "Sketch2" along normal blind 10 contours A1 | A3
extrude "Extrusion6" add sketch "Sketch2" along normal blind 3 contours L9 L10 L11 A1 L0 | L7 L5 L3 L1 A3
sketch "Sketch3" plane through (-37.3459, 0, 39.6149) normal (-1, 0, 0) x (0, 0, 1)
  circle A0 centre (5, 4) radius 2
  line L0 (10, 0) -> (10, 8) projected
  arc A1 (2, 0) -> (2, 8) centre (5, 4) ccw
  circle A2 centre (-84.2298, 4) radius 2
  line L1 (-89.2298, 0) -> (-89.2298, 8) projected
  arc A3 (-81.2298, 8) -> (-81.2298, 0) centre (-84.2298, 4) ccw
  line L2 (-89.2298, 0) -> (-79.2298, 0) projected
  line L3 (-87.2298, 0) -> (-89.2298, 0)
  line L4 (-89.2298, 0) -> (-89.2298, 8) projected
  line L5 (-89.2298, 0) -> (-89.2298, 8)
  line L6 (-89.2298, 8) -> (-87.2298, 8)
  line L7 (-79.2298, 8) -> (-89.2298, 8) projected
  arc A4 (-87.2298, 8) -> (-87.2298, 0) centre (-84.2298, 4) ccw
  line L8 (0, 0) -> (10, 0) projected
  line L9 (10, 8) -> (0, 8) projected
  arc A5 (8, 0) -> (8, 8) centre (5, 4) ccw
  line L10 (8, 0) -> (10, 0)
  line L11 (10, 8) -> (8, 8)
  point P0 (-39.6149, 0)
  point P1 (10, 4)
  point P2 (-89.2298, 4)
  dimension "d45" = 4
  dimension "d46" = 5
  dimension "d47" = 4
  dimension "d48" = 5
extrude "Extrusion7" add sketch "Sketch3" against normal blind 7.7 contours A1 L8 | L9 A1 | A3 L7 | L2 A3
extrude "Extrusion8" cut sketch "Sketch3" against normal blind 10 contours A0 | L8 A1 L0 | A1 L9 L0 | A2 | L1 L6 A3 | L1 A3 L2
properties part number "PX9200-11"
